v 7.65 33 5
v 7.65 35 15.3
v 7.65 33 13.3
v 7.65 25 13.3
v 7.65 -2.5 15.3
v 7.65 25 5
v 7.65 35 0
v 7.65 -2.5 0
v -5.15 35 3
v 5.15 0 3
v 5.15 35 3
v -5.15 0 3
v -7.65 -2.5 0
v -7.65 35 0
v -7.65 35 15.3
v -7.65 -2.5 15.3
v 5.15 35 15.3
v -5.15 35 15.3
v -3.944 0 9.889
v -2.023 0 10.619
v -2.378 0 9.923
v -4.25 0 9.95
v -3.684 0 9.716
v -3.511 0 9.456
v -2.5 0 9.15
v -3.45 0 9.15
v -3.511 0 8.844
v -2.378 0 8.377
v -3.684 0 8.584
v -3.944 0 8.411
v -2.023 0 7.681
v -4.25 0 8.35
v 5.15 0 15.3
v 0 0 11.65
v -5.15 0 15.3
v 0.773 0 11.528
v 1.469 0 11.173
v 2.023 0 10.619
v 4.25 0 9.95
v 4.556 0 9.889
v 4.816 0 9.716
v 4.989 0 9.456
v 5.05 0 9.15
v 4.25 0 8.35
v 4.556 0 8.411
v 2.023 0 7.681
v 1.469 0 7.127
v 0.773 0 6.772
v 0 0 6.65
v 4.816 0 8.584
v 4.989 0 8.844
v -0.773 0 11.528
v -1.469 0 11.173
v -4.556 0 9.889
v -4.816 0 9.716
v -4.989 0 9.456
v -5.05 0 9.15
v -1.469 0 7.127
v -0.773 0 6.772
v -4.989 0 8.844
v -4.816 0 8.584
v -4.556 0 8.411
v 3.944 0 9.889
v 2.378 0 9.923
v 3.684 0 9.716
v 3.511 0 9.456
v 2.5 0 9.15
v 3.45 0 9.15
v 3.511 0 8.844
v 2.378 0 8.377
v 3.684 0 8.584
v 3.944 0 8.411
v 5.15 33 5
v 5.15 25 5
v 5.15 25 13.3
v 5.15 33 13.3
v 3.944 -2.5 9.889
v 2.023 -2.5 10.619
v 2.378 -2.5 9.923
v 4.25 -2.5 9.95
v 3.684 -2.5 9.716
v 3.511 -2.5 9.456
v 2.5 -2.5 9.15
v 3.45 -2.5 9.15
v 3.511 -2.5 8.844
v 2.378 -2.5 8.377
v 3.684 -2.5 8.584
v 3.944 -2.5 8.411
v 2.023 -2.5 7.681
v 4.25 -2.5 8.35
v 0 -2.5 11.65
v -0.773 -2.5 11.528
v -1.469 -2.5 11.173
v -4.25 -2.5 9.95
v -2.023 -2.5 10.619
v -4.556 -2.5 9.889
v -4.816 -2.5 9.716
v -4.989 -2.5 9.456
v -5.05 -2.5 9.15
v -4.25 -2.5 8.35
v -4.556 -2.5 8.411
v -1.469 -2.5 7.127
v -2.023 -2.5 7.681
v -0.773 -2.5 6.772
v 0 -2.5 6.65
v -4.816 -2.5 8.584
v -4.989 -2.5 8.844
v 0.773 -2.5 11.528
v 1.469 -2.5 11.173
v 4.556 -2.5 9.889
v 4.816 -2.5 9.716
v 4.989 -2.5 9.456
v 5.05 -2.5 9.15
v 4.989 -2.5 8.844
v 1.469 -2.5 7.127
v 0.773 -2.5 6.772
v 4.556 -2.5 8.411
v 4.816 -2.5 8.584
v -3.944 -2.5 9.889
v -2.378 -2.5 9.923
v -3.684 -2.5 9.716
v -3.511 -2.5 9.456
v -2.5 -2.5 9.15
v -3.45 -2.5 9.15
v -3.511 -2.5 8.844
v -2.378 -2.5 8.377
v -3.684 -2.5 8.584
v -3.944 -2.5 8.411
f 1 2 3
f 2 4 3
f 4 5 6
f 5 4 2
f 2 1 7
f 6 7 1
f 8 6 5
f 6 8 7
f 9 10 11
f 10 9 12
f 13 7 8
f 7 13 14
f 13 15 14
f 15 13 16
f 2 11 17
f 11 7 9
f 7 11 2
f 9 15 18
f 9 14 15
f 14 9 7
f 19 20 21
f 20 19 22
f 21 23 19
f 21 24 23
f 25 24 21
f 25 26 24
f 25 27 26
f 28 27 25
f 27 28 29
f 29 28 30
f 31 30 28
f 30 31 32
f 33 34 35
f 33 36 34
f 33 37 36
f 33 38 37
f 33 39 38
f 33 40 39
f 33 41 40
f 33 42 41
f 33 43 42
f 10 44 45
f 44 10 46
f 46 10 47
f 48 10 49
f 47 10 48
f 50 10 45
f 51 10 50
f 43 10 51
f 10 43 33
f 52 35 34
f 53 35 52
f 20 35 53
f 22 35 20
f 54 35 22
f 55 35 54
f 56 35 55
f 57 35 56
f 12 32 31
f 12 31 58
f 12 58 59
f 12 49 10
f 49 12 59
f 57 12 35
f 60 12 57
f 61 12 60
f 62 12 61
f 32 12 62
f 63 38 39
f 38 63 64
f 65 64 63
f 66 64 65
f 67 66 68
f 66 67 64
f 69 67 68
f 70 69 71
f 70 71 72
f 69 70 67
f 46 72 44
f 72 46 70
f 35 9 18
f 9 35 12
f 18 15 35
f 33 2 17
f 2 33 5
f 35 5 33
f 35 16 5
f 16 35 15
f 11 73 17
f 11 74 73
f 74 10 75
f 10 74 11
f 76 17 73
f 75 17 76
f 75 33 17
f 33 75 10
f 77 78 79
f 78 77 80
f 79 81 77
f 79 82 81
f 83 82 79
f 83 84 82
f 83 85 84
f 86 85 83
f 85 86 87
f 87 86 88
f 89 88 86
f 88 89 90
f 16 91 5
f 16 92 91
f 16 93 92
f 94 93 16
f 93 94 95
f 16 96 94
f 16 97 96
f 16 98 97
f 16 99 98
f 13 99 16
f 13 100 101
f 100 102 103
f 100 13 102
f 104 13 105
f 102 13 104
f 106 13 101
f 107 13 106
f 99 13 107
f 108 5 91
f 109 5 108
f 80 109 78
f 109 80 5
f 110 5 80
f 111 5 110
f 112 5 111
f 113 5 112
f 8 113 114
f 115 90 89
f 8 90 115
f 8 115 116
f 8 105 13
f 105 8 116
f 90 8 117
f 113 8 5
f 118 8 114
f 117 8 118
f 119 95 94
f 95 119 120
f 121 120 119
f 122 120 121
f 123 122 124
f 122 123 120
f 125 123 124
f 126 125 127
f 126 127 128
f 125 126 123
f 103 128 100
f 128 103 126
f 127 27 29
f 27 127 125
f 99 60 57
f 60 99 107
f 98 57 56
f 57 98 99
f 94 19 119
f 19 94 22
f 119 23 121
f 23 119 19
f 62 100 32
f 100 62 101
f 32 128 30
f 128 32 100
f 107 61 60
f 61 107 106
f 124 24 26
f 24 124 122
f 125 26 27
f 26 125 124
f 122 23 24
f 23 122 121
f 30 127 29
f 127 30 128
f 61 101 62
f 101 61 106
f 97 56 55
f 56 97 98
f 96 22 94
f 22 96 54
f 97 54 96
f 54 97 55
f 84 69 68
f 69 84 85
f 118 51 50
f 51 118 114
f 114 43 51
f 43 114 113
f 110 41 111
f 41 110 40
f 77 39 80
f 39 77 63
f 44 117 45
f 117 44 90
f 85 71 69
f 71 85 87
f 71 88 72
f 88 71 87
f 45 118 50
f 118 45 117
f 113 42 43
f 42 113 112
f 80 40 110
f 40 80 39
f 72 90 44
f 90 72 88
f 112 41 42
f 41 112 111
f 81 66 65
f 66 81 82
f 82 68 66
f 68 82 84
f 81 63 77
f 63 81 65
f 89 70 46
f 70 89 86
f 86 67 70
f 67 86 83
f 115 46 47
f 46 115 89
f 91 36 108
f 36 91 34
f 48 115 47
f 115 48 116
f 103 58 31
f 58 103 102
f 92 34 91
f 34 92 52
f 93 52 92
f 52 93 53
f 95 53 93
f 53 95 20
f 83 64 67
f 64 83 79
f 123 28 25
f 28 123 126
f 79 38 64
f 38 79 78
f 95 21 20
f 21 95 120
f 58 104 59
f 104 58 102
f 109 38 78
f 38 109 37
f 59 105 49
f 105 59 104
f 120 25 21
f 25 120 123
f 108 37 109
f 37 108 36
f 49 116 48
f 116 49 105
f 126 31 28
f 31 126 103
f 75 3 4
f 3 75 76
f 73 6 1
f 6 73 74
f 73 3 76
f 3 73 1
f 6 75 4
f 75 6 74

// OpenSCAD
// =====================================================
// BRACKET DE MOTOR POLOLU N20 MICRO METAL GEARMOTOR
// Para montaje en chasis del robot WRO
// =====================================================
// Compatible con: Pololu 30:1, 50:1, 100:1 HPCB 6V
// con encoder integrado (back connector)
// Dimensiones motor: 10×12×26mm (sin eje)
// Eje de salida: 3mm D-shaft, 9mm largo
// =====================================================

// === DIMENSIONES DEL MOTOR POLOLU N20 ===
motor_ancho = 10;         // mm
motor_alto  = 12;         // mm 
motor_largo = 26;         // mm (sin eje, sin encoder)
motor_largo_total = 33;   // mm (con encoder back connector)
motor_eje_d = 3;          // mm, D-shaft
motor_eje_largo = 9;      // mm

// Agujeros de montaje del motor
motor_mount_d = 1.6;      // mm (M1.6 threads en faceplate)
motor_mount_sep_x = 8.5;  // mm entre agujeros
motor_mount_sep_y = 0;    // mm (alineados verticalmente)

// === PARÁMETROS DEL BRACKET ===
bracket_pared = 2.5;      // mm, espesor de pared
bracket_base  = 3;        // mm, espesor de la base de montaje

// Insertos para montaje al chasis
chasis_mount_d = 3.2;     // mm (inserto M2)
chasis_mount_sep = 20;    // mm, distancia entre agujeros de montaje al chasis

// === MÓDULO BRACKET ===
module bracket_pololu_n20() {
    // Bracket en U que abraza el motor
    
    ancho_int = motor_ancho + 0.3;  // tolerancia 0.15mm por lado
    alto_int  = motor_alto + 0.3;
    largo_bracket = motor_largo_total + 2;  // espacio para encoder
    
    ancho_ext = ancho_int + 2 * bracket_pared;
    alto_ext  = alto_int + bracket_base;
    
    difference() {
        union() {
            // Base del bracket
            translate([-ancho_ext/2, 0, 0])
                cube([ancho_ext, largo_bracket, bracket_base]);
            
            // Pared izquierda
            translate([-ancho_ext/2, 0, 0])
                cube([bracket_pared, largo_bracket, alto_ext]);
            
            // Pared derecha
            translate([ancho_int/2, 0, 0])
                cube([bracket_pared, largo_bracket, alto_ext]);
            
            // Tapa frontal (donde sale el eje)
            translate([-ancho_ext/2, -bracket_pared, 0])
                cube([ancho_ext, bracket_pared, alto_ext]);
        }
        
        // Cavidad para el motor
        translate([-ancho_int/2, 0, bracket_base])
            cube([ancho_int, largo_bracket + 0.1, alto_int + 0.1]);
        
        // Agujero para el eje del motor (faceplate)
        translate([0, -bracket_pared - 0.1, bracket_base + alto_int/2])
            rotate([-90, 0, 0])
                cylinder(d=motor_eje_d + 2, h=bracket_pared + 0.2, $fn=20);
        
        // Agujeros de montaje del motor (M1.6) en faceplate
        for (dx = [-motor_mount_sep_x/2, motor_mount_sep_x/2])
            translate([dx, -bracket_pared - 0.1, bracket_base + alto_int/2])
                rotate([-90, 0, 0])
                    cylinder(d=motor_mount_d, h=bracket_pared + 0.2, $fn=16);
        
        // Agujeros de montaje al chasis (M2 insertos)
        for (dx = [-chasis_mount_sep/2, chasis_mount_sep/2])
            translate([dx, largo_bracket/2, -0.1])
                cylinder(d=chasis_mount_d, h=bracket_base + 0.2, $fn=20);
        
        // Ventana lateral para cables del encoder
        translate([ancho_int/2 - 0.1, largo_bracket - 10, bracket_base + 2])
            cube([bracket_pared + 0.2, 8, alto_int - 4]);
    }
}

// === RENDER ===
bracket_pololu_n20();

// Para visualizar con el motor (no exportar):
// %translate([- motor_ancho/2, 0, bracket_base + 0.15])
//     cube([motor_ancho, motor_largo_total, motor_alto]);
